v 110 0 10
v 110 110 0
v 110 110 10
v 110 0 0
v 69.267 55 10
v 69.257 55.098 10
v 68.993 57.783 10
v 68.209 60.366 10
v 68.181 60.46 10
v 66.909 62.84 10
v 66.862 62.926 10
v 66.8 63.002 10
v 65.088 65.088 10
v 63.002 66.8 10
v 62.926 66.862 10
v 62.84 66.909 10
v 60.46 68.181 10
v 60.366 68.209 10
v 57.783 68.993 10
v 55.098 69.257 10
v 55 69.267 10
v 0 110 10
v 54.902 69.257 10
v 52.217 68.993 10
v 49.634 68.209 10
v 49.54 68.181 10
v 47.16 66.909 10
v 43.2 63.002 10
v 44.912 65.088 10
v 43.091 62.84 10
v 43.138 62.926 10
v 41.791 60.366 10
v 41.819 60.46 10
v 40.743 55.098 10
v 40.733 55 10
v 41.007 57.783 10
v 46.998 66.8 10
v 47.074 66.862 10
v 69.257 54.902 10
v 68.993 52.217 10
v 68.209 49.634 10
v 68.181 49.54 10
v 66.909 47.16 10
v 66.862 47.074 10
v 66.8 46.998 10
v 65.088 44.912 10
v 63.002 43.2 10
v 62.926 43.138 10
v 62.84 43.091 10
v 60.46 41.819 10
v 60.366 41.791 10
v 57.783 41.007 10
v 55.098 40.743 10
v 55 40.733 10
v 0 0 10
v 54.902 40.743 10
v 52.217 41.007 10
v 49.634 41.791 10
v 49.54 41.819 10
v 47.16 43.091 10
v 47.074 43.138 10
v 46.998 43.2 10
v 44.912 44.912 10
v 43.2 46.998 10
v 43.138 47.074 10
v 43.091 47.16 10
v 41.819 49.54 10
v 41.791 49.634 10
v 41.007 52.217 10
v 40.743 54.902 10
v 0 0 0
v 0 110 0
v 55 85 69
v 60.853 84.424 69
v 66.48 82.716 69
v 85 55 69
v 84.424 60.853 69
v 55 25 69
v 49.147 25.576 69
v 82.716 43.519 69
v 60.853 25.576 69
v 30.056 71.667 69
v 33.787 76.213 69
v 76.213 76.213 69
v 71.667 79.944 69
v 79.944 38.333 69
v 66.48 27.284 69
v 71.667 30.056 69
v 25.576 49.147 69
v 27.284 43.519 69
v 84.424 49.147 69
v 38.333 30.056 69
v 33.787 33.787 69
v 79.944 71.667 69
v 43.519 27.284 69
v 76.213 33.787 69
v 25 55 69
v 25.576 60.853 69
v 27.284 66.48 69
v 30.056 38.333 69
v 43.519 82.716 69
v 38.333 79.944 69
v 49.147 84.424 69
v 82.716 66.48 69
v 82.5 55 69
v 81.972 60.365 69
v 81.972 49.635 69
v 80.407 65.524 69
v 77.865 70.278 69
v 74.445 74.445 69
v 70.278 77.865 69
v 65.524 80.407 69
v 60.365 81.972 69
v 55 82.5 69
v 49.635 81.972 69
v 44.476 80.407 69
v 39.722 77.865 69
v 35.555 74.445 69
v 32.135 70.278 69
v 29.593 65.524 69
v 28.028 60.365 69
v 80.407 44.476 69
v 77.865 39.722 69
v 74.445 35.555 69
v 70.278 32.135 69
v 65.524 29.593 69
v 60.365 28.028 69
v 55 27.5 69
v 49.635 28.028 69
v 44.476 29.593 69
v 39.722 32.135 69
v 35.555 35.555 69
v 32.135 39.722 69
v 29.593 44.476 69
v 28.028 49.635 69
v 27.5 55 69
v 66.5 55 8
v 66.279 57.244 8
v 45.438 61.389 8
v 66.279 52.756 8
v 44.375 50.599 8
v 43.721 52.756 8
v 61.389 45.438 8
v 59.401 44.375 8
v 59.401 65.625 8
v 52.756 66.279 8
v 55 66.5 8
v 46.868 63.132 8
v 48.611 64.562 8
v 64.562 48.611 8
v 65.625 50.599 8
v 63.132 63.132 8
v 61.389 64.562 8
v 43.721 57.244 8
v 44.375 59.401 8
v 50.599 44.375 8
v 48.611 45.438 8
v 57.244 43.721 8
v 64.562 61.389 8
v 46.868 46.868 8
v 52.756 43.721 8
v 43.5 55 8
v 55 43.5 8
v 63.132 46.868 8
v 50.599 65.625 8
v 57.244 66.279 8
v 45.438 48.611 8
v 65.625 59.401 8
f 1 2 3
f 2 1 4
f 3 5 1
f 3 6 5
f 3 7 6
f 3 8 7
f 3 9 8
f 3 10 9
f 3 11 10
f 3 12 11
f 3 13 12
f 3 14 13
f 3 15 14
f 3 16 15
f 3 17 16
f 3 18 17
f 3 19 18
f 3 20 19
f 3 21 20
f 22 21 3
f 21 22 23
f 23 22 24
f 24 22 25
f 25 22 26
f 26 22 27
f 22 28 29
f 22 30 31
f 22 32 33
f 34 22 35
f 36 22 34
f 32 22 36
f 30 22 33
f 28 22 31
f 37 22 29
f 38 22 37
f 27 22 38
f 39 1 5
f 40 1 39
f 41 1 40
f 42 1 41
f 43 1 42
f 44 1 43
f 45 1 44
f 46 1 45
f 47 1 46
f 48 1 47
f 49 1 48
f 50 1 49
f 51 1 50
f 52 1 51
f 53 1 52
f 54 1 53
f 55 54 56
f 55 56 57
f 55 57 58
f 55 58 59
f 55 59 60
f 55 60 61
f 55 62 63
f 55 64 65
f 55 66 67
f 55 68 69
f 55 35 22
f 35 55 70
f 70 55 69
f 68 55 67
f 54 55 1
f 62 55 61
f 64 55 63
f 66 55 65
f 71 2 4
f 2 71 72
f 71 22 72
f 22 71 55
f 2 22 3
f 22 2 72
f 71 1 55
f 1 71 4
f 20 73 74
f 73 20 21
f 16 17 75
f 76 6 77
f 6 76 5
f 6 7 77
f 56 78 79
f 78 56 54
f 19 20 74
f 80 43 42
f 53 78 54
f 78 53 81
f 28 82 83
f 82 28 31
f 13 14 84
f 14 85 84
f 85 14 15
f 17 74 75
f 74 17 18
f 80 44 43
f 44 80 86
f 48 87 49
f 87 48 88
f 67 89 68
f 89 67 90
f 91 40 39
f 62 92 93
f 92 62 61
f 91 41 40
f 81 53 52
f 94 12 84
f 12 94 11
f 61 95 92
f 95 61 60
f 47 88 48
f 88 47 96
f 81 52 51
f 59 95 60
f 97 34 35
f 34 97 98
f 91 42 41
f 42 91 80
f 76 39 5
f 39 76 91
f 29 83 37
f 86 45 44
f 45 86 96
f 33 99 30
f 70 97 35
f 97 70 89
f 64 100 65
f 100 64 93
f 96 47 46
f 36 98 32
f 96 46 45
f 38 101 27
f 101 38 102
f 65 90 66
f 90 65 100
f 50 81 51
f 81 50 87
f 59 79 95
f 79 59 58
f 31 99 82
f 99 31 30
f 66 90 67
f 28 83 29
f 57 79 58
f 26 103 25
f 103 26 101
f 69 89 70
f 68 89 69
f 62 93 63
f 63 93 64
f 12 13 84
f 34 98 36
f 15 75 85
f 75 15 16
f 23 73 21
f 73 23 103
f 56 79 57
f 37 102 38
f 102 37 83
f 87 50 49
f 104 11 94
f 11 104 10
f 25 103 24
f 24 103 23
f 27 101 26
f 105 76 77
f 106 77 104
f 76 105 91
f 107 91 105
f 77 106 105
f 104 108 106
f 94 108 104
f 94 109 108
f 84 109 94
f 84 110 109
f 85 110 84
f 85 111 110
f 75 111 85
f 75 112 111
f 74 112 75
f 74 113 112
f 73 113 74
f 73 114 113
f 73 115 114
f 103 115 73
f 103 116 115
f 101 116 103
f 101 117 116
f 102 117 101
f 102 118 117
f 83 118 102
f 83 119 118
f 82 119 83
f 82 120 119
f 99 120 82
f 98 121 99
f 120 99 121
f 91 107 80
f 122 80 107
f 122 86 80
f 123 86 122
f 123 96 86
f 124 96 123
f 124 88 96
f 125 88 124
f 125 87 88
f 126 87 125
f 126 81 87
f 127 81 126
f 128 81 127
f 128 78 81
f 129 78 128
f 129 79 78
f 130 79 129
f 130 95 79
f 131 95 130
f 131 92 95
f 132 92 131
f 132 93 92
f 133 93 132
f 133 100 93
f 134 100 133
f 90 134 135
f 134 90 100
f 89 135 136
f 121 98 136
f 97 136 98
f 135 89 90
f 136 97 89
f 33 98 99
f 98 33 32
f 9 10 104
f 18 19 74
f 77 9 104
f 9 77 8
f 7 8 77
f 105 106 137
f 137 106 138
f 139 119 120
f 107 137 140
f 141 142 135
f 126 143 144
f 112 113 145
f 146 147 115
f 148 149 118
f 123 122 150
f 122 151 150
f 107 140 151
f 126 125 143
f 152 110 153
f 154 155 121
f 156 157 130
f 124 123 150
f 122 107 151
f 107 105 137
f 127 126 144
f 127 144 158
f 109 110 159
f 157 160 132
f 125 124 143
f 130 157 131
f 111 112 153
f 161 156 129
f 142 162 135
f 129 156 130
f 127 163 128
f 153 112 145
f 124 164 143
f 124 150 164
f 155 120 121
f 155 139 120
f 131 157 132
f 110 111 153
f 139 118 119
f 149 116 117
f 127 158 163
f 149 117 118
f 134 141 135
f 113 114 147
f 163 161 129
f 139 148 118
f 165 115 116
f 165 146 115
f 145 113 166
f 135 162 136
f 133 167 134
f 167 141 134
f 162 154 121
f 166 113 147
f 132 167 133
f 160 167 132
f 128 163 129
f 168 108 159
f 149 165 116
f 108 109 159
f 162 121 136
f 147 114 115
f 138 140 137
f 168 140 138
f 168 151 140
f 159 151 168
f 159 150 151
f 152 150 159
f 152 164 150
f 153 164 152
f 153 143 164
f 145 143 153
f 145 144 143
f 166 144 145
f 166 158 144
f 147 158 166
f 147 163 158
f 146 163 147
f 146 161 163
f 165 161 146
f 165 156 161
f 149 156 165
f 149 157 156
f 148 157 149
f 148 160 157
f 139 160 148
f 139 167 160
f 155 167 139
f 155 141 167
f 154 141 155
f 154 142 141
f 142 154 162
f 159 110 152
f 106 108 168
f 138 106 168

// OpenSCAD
$fn = 32;

// ----------------------------------------------------------------------
// Hopper: funnel with square flange
// ----------------------------------------------------------------------

// --- parameters (mm) ---
fl = 110;                 // flange side, X and Y
fl_t = 10;                // flange thickness
cone_h = 60;              // cone height above the flange
top_d = 60;               // cone mouth diameter
bot_d = 28;               // cone spout diameter
wall = 2.5;               // cone wall thickness
fit_tol = 0.05;           // tolerance for press fits, mm
free_tol = 0.2;           // tolerance for clearance fits, mm

bore_d = bot_d - 2 * wall;  // spout bore diameter
total_h = fl_t + cone_h - 1;  // overall height

difference() {
  union() {
    cube([fl, fl, fl_t]);
    translate([fl / 2, fl / 2, fl_t - 1])
      cylinder(h = cone_h, d1 = bot_d, d2 = top_d);
  }
  translate([fl / 2, fl / 2, fl_t - 2])
    cylinder(h = cone_h + 1, d1 = bore_d, d2 = top_d - 2 * wall);
}
